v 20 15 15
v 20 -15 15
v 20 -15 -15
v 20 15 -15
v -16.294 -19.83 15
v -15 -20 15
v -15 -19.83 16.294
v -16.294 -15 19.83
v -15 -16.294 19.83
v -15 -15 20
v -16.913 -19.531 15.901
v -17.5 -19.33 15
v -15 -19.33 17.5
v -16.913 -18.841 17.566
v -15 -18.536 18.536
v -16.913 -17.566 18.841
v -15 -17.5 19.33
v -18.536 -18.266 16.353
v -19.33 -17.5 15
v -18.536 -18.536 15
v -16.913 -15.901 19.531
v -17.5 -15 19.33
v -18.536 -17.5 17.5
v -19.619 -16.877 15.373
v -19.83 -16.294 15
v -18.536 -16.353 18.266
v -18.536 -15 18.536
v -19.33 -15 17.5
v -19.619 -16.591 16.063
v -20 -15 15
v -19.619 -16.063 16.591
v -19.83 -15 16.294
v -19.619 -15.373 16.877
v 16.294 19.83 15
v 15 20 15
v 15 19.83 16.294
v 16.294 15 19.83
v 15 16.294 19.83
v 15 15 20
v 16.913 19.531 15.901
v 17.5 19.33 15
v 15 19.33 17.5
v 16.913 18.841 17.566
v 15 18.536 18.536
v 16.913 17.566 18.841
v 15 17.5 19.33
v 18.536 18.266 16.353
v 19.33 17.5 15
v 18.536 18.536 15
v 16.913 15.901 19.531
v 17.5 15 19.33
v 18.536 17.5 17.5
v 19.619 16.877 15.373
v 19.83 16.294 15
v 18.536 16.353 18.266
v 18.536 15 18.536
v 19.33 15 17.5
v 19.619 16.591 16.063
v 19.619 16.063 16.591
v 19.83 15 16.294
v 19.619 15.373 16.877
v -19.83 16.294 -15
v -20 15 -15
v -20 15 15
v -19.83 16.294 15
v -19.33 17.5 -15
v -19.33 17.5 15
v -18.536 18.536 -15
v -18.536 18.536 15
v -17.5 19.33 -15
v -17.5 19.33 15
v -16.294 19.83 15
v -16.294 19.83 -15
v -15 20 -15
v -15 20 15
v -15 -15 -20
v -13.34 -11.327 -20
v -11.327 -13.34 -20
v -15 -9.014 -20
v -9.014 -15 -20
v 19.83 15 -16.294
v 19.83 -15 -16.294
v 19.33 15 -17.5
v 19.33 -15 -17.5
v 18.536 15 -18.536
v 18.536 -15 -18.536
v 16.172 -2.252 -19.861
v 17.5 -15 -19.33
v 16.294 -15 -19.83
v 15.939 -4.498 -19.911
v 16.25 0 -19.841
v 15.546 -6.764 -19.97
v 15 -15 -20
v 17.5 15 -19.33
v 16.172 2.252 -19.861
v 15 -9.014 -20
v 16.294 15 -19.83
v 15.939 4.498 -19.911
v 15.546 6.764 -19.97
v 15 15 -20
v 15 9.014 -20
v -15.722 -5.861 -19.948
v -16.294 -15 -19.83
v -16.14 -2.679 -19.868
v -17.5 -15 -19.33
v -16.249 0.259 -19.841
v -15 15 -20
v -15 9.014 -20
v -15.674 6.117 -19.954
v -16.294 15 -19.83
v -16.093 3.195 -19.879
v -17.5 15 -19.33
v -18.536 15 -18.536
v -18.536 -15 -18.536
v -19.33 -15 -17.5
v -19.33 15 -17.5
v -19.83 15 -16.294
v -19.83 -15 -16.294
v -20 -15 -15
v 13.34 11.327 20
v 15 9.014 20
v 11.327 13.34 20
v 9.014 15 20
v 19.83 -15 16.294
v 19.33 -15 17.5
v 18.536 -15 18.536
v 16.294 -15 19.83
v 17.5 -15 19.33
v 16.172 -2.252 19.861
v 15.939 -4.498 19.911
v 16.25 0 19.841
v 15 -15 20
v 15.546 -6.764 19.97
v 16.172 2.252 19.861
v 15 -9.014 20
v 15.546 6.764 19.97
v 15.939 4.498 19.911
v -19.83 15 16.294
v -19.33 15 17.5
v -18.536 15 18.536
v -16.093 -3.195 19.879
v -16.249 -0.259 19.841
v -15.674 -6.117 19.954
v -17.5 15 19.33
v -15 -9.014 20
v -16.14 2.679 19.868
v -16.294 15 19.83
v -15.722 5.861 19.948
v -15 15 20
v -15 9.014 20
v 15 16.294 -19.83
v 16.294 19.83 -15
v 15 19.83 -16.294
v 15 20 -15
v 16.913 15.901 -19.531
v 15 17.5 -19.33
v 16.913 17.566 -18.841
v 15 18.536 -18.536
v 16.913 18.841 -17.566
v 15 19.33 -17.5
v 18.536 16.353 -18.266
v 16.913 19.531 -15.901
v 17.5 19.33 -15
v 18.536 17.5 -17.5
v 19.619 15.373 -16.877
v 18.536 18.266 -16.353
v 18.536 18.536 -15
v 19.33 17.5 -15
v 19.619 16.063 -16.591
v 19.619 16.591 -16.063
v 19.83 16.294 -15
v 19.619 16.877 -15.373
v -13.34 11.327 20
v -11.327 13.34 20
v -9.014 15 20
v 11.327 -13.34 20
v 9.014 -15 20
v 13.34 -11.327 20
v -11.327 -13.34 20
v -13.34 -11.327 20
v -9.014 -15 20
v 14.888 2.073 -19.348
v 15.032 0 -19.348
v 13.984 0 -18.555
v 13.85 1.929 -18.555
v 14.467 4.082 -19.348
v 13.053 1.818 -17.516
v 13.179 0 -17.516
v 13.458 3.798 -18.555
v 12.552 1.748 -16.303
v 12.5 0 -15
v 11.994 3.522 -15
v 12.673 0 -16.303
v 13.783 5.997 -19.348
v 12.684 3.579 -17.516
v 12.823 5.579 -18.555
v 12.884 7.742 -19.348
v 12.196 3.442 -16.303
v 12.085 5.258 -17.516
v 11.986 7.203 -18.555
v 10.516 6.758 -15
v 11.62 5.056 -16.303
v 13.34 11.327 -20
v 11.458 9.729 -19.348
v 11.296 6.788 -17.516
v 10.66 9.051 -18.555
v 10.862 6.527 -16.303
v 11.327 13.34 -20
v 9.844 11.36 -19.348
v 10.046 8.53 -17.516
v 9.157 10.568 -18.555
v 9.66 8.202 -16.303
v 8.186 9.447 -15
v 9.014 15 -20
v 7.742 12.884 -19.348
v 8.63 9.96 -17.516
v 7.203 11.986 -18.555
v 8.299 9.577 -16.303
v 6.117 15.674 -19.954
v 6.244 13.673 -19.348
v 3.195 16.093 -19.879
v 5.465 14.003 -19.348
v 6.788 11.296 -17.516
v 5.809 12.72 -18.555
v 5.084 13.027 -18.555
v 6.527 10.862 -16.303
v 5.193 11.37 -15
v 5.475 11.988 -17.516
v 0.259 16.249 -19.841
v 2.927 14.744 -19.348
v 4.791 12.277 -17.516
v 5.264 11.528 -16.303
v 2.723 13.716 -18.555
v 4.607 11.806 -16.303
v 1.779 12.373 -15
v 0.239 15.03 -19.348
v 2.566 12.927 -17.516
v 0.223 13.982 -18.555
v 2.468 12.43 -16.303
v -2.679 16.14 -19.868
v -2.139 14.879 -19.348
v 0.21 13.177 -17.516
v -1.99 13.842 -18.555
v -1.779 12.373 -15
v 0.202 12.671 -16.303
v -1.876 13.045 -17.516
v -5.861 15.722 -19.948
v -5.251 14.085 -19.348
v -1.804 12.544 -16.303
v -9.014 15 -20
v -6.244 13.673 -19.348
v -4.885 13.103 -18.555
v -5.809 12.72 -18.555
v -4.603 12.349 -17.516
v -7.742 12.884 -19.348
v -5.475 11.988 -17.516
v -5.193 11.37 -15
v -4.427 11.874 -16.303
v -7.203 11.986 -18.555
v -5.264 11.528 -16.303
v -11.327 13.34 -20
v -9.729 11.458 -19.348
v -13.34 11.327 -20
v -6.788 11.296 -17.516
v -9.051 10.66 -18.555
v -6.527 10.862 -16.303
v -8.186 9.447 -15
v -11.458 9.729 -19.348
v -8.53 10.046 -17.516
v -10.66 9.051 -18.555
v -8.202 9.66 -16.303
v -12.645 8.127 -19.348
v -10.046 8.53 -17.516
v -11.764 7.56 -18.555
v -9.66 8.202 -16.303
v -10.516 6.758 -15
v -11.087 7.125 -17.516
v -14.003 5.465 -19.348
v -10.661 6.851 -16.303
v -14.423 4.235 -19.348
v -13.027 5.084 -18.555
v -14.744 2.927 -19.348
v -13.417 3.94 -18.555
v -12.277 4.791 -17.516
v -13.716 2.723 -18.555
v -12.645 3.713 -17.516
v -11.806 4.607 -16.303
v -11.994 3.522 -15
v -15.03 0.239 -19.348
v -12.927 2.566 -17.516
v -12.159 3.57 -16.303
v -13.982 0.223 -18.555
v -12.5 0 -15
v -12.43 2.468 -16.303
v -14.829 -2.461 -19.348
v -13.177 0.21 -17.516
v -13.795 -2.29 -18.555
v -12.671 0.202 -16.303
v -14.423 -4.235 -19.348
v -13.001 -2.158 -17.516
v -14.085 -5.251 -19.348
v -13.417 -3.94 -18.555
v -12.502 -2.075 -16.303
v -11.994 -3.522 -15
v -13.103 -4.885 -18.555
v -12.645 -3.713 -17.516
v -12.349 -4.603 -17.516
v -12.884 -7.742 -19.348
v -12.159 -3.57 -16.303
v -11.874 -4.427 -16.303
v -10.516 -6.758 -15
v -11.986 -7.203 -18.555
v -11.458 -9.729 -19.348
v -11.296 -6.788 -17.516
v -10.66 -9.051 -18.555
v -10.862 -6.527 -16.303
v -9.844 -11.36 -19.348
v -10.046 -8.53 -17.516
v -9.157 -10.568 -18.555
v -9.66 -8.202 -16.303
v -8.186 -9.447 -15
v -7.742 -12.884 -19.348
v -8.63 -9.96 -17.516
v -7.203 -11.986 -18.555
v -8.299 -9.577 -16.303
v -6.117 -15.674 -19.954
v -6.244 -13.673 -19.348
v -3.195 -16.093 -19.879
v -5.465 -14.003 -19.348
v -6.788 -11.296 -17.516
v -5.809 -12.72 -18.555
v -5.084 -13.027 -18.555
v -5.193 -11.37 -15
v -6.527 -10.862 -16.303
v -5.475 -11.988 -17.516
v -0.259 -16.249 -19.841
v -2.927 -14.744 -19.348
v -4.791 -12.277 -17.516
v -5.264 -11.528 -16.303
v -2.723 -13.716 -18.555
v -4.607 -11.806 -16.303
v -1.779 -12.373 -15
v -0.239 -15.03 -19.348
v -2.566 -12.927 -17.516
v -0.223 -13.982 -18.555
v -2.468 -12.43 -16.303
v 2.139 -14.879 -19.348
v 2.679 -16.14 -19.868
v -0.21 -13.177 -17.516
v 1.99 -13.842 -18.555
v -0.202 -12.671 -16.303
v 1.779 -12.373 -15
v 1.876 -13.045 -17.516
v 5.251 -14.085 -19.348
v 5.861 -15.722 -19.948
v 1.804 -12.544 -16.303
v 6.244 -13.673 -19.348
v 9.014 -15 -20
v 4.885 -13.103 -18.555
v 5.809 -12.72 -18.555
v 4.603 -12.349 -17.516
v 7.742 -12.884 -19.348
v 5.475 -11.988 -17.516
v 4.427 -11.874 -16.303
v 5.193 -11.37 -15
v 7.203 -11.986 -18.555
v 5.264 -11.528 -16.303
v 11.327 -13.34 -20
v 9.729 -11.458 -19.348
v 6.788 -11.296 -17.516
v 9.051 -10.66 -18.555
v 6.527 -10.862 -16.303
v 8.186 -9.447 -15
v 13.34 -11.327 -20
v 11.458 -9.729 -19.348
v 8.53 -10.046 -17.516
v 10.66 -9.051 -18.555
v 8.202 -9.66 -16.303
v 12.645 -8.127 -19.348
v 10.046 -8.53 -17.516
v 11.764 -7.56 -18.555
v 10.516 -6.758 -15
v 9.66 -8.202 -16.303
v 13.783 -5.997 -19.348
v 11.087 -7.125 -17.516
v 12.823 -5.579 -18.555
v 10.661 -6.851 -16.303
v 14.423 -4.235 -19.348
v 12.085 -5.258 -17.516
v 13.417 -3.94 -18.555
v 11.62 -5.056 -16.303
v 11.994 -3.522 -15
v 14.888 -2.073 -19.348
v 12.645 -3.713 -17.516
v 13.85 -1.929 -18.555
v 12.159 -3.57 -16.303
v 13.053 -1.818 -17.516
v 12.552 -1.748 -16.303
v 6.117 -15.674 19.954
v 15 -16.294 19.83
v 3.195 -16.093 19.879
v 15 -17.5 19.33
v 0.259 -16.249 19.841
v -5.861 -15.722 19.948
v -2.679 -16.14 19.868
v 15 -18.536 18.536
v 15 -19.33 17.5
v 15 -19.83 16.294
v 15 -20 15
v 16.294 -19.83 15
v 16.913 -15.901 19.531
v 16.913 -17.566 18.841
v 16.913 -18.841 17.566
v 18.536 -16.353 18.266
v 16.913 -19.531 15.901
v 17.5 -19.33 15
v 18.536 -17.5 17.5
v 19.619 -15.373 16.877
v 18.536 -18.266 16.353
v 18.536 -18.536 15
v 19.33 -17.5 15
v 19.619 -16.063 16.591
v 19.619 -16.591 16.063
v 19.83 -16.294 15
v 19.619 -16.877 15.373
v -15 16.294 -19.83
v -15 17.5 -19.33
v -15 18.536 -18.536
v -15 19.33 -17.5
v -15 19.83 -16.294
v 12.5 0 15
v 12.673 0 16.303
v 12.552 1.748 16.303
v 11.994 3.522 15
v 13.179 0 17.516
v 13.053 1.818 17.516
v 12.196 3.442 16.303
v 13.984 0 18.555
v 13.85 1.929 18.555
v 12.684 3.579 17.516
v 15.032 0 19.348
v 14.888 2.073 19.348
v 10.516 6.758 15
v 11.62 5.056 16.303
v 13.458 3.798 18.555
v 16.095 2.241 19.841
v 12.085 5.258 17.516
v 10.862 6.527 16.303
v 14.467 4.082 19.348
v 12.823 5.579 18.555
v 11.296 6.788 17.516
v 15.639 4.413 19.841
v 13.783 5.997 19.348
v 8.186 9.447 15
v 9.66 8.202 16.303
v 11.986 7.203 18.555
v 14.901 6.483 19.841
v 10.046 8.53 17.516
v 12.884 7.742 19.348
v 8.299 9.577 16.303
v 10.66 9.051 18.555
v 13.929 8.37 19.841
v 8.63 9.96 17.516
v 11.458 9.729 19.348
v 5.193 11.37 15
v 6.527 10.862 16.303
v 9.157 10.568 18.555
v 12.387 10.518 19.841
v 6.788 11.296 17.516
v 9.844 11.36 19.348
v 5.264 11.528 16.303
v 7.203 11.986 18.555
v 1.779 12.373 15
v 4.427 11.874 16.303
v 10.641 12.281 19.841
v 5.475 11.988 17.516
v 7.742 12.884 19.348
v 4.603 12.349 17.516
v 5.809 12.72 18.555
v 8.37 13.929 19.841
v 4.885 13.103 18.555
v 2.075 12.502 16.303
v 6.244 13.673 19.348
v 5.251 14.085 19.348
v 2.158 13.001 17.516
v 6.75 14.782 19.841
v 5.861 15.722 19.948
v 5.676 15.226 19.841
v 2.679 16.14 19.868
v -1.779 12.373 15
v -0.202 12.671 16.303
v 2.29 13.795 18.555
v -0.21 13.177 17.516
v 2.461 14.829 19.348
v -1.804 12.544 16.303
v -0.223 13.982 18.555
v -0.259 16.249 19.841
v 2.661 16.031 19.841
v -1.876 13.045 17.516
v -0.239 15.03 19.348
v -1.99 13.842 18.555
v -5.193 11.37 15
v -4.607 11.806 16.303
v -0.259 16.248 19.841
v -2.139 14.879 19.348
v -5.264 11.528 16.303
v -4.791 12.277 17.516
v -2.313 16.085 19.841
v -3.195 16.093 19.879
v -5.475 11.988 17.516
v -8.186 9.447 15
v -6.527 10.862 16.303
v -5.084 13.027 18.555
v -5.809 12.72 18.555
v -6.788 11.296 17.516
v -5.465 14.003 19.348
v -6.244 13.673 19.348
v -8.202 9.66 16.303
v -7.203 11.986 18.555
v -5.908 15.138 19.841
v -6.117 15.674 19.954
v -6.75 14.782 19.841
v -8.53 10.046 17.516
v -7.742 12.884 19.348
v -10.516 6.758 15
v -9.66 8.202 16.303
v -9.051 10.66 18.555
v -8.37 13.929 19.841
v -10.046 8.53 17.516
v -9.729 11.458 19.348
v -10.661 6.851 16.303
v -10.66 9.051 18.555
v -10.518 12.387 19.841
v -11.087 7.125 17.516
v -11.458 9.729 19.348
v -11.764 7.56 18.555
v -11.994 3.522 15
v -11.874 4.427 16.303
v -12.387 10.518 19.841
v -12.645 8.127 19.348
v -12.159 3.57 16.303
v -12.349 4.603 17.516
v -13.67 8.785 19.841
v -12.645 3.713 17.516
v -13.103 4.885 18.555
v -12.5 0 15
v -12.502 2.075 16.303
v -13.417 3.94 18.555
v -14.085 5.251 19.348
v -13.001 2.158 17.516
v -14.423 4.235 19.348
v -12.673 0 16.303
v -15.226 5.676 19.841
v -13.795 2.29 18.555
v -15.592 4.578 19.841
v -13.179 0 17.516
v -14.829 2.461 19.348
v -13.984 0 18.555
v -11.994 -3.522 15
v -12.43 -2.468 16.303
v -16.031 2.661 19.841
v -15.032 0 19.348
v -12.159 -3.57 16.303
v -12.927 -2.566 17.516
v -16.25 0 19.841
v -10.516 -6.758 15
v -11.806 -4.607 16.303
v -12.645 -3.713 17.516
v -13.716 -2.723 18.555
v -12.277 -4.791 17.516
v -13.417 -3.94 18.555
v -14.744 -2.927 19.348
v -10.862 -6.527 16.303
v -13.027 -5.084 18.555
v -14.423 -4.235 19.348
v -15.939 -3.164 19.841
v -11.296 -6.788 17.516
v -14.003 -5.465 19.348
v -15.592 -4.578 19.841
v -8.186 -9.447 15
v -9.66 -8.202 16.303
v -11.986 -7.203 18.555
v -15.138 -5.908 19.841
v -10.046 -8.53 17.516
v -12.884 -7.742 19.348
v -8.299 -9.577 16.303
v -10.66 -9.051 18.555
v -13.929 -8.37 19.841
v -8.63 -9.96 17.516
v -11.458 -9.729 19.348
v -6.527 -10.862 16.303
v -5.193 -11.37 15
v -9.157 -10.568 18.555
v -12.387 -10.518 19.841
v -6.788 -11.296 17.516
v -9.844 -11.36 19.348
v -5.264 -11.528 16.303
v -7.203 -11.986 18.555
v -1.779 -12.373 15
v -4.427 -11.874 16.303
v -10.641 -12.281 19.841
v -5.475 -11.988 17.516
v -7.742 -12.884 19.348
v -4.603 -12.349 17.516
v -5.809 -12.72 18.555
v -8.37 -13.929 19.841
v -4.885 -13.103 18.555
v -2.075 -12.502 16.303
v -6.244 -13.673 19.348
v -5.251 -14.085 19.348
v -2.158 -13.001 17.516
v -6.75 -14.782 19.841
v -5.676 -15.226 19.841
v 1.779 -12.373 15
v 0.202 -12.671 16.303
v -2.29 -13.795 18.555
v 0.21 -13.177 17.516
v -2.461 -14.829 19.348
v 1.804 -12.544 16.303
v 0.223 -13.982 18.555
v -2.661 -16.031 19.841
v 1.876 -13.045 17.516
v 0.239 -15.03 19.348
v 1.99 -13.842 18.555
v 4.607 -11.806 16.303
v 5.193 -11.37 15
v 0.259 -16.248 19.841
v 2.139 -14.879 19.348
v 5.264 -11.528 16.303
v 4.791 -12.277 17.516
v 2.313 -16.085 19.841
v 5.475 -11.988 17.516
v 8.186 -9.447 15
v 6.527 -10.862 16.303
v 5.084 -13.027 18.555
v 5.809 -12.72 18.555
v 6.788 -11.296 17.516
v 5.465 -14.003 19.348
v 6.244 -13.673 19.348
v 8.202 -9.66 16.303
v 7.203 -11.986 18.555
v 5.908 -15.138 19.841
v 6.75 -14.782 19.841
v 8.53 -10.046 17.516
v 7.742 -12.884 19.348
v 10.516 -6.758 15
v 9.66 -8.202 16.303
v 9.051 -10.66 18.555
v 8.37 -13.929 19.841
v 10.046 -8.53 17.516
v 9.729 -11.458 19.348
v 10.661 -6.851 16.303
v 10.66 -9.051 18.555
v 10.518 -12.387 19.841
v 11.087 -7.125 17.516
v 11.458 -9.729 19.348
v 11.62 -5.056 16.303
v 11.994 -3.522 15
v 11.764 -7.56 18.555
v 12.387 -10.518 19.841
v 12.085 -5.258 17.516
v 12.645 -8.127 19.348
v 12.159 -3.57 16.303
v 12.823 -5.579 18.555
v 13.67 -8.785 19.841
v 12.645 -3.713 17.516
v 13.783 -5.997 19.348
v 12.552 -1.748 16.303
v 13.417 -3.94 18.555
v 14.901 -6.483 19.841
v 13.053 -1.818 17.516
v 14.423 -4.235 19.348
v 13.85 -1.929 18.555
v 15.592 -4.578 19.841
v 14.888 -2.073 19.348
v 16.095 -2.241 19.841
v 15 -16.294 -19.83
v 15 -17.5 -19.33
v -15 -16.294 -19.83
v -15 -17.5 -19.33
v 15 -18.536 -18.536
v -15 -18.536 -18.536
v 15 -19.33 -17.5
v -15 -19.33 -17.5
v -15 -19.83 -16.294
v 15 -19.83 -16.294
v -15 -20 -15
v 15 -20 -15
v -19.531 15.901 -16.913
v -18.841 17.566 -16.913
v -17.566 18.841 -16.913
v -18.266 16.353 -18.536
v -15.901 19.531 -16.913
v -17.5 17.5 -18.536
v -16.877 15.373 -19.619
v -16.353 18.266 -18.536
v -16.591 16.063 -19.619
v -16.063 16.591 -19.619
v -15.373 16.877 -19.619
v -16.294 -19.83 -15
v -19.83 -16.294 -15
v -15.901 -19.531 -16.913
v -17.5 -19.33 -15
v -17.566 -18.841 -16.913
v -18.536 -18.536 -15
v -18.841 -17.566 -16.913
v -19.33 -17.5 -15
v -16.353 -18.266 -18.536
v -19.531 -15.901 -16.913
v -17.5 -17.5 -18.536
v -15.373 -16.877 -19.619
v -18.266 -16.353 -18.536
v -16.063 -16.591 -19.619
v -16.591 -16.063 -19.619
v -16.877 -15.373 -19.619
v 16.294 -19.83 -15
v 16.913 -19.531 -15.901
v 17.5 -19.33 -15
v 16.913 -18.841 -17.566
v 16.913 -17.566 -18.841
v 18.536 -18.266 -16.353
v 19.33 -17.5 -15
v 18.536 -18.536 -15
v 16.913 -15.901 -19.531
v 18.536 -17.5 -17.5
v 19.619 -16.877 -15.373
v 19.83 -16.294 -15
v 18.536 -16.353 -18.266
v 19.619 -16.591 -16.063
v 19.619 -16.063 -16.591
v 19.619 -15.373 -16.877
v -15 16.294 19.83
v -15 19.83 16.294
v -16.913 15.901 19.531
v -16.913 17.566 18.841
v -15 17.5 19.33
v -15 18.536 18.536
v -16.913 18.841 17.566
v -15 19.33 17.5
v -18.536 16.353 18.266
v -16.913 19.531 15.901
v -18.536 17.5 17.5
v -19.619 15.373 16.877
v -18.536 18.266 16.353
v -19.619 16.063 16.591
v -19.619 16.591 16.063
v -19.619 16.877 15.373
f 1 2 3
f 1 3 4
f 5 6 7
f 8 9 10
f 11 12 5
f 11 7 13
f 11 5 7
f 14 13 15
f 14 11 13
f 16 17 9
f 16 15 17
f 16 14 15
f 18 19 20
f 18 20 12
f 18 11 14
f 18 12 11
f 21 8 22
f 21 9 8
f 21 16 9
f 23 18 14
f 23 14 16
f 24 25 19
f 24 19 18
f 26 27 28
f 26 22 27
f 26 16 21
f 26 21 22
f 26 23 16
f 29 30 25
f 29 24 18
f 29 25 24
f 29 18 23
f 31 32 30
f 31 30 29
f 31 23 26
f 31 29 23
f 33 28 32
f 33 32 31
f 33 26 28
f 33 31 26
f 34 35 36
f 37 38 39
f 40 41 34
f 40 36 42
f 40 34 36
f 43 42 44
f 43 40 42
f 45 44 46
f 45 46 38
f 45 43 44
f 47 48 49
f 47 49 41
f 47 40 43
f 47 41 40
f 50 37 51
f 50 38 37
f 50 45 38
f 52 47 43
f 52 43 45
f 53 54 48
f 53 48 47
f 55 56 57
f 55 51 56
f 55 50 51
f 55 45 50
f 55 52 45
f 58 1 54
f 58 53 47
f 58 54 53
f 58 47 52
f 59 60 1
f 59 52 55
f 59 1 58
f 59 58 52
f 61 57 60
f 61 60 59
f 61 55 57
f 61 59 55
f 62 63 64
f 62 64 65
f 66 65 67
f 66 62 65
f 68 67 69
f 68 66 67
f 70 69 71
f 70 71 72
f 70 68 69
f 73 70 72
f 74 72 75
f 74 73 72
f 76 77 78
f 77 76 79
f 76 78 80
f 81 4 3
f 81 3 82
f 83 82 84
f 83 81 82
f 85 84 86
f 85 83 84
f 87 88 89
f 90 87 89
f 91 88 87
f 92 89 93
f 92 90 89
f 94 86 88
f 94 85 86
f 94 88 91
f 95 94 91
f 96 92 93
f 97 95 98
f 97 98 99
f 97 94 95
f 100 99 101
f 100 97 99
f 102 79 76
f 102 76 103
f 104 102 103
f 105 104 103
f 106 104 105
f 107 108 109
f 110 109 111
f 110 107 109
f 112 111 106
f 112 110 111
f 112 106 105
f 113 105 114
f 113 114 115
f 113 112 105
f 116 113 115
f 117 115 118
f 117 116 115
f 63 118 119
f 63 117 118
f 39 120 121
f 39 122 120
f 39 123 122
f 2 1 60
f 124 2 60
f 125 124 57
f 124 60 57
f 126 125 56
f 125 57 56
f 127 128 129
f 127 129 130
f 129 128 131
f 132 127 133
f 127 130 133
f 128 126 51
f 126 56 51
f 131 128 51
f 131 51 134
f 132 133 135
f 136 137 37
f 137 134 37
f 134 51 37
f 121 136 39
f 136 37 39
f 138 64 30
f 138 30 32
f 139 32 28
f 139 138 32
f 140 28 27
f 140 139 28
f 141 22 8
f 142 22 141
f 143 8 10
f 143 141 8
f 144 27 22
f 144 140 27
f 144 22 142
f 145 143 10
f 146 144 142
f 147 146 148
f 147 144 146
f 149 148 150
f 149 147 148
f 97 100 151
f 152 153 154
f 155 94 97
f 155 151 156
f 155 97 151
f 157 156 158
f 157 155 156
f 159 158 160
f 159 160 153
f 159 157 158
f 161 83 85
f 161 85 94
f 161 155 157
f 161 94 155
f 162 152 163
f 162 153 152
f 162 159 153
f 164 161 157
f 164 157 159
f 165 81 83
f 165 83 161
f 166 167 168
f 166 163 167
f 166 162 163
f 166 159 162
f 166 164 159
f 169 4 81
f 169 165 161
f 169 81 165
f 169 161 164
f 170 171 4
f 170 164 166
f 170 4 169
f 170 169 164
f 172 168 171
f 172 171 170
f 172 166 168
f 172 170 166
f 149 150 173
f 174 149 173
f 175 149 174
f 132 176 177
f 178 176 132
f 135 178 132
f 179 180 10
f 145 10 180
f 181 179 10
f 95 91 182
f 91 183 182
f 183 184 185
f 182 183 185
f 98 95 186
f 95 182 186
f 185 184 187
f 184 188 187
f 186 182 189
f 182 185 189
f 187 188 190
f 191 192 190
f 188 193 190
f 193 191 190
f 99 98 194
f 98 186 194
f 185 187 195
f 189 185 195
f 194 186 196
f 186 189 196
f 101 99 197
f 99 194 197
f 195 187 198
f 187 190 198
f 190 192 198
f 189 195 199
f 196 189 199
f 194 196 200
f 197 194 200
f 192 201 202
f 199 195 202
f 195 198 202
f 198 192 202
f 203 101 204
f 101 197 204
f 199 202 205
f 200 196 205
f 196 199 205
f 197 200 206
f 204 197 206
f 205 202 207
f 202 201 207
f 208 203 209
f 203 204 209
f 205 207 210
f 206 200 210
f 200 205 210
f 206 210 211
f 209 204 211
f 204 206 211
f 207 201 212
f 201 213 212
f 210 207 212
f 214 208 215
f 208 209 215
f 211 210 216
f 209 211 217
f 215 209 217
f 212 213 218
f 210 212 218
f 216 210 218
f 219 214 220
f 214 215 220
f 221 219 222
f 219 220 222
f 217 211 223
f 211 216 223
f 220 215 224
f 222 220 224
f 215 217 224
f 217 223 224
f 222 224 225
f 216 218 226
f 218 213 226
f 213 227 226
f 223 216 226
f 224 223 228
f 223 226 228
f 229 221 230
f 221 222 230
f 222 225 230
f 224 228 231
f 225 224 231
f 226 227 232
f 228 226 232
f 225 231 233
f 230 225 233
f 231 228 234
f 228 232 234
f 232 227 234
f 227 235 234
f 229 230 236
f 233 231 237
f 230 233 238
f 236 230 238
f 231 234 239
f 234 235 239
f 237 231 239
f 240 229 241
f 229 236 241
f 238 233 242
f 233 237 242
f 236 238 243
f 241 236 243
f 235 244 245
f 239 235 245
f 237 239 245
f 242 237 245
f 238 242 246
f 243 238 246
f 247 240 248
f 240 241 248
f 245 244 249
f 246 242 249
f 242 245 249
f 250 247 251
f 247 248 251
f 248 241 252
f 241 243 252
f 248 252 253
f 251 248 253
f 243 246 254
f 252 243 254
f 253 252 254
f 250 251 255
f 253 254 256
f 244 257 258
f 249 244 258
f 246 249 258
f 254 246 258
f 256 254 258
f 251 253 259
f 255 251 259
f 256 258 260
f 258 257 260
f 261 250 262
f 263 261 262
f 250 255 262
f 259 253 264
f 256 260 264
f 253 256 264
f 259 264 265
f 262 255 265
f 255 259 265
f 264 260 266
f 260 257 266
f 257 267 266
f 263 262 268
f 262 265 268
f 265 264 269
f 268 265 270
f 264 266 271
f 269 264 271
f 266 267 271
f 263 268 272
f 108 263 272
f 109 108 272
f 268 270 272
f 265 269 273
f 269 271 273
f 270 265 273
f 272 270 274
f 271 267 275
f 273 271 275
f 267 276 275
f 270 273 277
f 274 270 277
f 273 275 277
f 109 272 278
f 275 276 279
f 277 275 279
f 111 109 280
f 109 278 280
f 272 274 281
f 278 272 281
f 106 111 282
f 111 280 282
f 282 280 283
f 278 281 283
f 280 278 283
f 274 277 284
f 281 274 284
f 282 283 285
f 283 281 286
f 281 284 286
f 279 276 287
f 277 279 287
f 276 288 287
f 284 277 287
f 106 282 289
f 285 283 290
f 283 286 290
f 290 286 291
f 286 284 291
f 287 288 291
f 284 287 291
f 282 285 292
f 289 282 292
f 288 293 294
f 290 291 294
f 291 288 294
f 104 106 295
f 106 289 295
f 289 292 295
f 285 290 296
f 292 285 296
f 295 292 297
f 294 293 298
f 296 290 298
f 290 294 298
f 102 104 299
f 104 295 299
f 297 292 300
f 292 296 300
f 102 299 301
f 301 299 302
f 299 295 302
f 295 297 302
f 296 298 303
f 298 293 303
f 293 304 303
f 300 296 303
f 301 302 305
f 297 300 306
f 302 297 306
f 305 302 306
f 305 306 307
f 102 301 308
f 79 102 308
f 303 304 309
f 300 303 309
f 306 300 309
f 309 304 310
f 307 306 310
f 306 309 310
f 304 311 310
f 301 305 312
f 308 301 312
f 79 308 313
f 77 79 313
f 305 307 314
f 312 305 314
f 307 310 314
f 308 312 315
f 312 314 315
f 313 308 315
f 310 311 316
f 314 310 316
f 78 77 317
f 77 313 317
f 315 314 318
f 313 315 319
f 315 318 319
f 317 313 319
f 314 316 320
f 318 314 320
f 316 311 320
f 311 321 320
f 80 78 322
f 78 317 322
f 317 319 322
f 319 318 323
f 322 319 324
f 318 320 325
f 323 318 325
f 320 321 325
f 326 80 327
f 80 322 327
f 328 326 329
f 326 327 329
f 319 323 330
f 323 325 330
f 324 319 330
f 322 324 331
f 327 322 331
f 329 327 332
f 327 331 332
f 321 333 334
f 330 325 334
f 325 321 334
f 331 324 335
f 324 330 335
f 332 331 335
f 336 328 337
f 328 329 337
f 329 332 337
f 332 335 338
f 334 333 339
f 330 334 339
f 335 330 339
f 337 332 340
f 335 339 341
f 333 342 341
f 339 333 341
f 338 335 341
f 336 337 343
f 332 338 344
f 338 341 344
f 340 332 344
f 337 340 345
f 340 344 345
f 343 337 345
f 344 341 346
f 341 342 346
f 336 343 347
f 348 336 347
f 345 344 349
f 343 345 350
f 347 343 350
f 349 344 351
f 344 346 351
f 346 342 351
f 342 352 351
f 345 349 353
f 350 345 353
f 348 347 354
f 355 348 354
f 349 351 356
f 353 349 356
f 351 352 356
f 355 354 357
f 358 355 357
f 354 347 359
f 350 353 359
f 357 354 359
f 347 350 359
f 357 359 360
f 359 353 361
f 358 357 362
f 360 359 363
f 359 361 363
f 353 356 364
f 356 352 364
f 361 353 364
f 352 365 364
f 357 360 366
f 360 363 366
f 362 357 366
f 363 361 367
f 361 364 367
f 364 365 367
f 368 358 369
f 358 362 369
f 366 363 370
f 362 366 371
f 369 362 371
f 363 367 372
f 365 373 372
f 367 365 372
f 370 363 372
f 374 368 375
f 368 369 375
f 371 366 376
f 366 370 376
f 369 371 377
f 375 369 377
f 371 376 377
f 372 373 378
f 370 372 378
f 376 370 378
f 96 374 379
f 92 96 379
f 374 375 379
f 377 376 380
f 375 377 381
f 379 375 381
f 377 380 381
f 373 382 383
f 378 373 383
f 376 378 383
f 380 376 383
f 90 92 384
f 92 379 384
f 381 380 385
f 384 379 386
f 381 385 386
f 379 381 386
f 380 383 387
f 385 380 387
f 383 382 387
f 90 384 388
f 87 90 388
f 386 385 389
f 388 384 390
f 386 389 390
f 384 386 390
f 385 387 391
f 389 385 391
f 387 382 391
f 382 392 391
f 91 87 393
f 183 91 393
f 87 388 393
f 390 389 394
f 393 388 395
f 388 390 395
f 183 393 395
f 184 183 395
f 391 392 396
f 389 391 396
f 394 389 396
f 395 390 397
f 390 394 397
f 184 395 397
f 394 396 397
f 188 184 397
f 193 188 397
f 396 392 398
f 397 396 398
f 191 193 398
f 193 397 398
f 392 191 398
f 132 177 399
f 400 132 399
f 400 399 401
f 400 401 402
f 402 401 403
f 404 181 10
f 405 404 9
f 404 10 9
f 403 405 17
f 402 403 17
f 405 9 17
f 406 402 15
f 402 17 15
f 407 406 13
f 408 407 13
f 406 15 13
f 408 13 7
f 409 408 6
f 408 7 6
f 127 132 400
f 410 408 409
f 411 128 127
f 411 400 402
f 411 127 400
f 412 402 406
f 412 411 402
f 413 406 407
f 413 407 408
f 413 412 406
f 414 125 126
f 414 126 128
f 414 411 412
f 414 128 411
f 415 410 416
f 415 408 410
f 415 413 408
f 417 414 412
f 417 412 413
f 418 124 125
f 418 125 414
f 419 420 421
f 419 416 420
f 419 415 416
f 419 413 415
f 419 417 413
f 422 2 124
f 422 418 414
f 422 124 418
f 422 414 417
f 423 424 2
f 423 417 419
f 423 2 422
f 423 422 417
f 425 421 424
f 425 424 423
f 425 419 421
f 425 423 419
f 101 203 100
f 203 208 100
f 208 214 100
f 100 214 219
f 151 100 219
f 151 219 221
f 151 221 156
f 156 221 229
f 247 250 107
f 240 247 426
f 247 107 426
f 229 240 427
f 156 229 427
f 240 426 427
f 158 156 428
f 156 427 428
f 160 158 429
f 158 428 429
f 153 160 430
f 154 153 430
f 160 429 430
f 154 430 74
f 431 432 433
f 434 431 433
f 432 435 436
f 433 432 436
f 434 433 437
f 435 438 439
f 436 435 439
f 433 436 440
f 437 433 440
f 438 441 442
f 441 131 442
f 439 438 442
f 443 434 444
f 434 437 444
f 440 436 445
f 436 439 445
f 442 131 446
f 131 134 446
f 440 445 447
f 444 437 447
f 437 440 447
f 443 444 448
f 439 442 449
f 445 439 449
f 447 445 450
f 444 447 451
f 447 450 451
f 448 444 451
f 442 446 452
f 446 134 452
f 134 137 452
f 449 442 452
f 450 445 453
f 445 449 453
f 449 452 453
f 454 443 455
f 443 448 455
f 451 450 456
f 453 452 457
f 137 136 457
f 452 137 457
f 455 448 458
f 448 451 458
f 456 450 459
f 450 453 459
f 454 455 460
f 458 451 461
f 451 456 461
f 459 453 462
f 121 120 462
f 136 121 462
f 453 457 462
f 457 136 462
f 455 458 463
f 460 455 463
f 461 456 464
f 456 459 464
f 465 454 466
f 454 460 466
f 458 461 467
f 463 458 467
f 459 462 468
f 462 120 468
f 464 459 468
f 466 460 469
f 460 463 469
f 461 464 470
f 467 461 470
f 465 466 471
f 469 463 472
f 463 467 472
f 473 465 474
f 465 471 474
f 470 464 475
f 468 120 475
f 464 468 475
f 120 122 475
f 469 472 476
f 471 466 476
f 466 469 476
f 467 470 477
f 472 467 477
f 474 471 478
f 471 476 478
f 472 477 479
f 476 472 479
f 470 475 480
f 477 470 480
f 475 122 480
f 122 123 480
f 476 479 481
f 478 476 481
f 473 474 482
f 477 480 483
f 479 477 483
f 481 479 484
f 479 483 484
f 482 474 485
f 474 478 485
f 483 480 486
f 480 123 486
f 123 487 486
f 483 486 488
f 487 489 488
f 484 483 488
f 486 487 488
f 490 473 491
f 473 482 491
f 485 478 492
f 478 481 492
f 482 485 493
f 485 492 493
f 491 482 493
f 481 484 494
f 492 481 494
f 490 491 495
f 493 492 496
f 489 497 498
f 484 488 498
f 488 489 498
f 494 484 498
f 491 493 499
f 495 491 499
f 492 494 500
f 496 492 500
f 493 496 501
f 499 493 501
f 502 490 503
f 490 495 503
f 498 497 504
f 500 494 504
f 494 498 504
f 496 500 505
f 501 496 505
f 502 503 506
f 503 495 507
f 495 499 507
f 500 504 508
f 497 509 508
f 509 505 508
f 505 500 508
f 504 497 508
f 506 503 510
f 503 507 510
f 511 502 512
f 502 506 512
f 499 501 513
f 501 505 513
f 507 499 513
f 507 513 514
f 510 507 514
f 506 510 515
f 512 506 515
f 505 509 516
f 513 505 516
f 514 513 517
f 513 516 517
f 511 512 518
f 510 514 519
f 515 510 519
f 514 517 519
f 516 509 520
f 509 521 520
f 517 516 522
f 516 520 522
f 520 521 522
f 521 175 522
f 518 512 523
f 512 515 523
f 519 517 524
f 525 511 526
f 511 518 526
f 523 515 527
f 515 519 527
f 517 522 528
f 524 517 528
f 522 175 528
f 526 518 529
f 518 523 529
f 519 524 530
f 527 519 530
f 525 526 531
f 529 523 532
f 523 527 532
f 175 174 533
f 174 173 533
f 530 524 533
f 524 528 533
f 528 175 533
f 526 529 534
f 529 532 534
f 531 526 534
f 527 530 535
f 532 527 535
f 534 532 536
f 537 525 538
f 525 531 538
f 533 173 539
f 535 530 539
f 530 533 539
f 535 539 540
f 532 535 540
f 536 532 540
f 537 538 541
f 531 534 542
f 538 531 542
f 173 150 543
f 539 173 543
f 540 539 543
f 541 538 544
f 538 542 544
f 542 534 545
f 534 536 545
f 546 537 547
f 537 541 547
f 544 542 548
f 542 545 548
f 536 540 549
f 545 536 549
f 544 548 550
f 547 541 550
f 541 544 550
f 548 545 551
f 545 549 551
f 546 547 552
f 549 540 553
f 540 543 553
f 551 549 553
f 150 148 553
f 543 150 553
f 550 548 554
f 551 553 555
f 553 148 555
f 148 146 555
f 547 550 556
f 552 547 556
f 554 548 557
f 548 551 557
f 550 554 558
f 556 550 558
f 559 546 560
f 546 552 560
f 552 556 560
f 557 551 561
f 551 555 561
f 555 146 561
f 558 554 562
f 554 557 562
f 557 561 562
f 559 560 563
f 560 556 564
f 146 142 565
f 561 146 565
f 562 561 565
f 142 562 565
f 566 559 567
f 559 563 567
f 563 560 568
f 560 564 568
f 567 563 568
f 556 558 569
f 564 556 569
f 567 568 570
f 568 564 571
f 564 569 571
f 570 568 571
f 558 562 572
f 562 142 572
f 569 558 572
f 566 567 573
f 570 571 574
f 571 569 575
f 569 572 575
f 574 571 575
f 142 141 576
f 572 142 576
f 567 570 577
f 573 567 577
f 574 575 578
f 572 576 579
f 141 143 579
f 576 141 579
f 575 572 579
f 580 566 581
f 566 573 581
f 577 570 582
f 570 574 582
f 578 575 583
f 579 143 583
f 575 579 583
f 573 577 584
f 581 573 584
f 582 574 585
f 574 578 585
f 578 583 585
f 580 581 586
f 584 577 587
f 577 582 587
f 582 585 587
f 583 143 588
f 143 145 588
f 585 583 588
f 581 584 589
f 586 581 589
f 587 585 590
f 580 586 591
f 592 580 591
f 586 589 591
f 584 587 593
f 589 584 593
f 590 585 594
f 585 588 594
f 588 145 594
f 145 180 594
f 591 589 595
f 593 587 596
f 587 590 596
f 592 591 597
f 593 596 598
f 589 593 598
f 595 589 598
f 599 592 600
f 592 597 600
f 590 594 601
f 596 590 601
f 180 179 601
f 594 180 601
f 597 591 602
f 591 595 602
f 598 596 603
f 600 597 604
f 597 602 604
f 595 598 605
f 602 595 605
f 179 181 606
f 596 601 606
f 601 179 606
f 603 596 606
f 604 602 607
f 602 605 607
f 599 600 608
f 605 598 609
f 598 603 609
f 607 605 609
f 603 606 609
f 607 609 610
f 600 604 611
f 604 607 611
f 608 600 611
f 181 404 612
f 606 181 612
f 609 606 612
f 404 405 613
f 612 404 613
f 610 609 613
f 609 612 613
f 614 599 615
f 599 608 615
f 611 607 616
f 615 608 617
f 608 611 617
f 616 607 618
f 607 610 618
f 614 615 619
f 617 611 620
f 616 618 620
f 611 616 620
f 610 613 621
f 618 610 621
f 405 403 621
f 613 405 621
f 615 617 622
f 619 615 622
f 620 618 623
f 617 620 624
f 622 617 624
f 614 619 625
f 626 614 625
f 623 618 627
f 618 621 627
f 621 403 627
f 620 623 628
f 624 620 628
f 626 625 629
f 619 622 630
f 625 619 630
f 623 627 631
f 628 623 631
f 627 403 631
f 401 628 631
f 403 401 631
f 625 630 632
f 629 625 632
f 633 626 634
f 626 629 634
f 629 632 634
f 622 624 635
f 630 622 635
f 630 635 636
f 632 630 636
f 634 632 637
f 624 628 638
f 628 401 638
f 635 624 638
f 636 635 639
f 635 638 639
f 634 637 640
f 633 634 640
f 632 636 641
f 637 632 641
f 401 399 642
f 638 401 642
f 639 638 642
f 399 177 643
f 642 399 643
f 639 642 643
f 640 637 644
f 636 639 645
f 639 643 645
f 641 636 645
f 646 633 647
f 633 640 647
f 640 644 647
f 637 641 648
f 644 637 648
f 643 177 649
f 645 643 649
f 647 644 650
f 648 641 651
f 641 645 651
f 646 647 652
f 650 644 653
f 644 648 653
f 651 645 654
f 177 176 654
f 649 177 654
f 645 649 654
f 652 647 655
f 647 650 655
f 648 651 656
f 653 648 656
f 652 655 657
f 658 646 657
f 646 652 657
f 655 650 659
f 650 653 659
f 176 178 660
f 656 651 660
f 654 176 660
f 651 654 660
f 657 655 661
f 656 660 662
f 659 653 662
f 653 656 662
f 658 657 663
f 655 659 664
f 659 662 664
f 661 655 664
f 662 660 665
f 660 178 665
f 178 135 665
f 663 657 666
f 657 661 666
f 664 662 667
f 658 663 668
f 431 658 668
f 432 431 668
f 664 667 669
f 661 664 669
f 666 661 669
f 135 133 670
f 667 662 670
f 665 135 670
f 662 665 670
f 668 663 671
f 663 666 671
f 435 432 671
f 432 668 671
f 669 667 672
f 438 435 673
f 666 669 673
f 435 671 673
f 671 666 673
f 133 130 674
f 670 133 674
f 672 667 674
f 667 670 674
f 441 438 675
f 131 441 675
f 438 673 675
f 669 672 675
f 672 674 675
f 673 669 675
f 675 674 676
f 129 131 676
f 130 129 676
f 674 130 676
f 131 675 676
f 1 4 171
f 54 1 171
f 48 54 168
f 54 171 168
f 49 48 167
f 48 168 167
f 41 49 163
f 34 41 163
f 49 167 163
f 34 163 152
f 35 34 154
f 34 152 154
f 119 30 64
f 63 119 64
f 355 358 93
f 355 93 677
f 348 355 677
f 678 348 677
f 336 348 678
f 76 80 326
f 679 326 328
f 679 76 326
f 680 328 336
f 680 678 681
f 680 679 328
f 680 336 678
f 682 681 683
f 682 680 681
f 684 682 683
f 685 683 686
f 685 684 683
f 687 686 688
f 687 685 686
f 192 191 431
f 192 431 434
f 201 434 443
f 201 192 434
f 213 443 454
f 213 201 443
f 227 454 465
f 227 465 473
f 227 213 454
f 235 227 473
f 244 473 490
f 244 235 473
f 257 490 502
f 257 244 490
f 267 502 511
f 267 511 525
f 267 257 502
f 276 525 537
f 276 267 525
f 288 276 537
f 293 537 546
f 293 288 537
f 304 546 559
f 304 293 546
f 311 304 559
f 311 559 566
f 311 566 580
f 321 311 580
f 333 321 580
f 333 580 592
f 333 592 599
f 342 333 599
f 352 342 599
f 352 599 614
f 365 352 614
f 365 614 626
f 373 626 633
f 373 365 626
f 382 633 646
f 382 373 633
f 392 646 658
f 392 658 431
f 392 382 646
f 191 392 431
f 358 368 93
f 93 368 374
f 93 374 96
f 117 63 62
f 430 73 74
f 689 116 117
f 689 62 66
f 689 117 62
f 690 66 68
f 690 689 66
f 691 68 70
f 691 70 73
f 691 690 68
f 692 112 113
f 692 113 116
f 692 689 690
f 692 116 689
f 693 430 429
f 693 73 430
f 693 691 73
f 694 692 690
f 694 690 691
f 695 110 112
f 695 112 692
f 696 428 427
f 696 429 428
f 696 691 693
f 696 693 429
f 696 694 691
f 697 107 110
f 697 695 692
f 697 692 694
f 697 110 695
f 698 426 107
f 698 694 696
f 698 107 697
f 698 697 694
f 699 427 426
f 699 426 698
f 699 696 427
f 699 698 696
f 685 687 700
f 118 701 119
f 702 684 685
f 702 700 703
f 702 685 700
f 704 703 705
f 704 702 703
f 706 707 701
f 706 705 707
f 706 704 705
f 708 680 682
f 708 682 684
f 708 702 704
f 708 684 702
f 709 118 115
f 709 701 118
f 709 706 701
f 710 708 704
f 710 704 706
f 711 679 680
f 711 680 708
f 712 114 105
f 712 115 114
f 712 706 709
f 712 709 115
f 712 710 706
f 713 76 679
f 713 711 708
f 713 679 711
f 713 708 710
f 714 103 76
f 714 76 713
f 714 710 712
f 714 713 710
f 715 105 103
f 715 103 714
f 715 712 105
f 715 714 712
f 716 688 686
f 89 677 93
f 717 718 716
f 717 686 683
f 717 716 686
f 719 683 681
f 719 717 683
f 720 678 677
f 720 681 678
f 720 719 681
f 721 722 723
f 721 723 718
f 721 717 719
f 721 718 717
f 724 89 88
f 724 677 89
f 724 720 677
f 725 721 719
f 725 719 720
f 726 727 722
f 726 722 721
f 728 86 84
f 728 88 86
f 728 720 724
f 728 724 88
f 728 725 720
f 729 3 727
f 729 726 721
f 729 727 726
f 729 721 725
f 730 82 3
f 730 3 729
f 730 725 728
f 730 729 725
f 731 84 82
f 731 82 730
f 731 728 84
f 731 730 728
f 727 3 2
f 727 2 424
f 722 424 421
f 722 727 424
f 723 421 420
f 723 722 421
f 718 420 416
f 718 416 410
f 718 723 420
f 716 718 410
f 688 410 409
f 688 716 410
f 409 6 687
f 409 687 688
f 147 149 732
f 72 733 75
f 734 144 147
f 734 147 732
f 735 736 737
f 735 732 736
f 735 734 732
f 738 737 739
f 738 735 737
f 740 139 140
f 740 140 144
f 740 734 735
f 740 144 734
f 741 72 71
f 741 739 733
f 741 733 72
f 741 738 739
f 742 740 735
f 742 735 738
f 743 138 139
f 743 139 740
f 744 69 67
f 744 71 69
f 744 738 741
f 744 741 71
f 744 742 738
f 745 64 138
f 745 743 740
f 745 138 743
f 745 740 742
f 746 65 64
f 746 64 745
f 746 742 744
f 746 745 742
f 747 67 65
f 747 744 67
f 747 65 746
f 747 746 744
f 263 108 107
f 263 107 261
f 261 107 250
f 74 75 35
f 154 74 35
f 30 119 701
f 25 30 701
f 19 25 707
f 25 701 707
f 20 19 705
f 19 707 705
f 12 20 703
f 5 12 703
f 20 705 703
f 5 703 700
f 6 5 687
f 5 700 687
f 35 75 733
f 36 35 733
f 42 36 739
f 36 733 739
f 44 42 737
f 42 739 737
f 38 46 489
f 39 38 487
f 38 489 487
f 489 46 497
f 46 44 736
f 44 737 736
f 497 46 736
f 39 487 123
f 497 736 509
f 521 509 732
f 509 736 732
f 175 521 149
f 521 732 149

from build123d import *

# Parameters (mm, degrees)
F0_W          = 40
F0_H          = 40
F0_R          = 12.5
F1_DEPTH      = 20
F1_DEPTH_BACK = 20
F2_T1_DEPTH   = 30
F2_T3_DEPTH   = 30
F2_T5_DEPTH   = 30
F2_S9_W       = 5
F2_S9_H       = 5
F2_T10_DEPTH  = 5
F2_S15_W      = 5
F2_S15_H      = 5
F2_T16_DEPTH  = 5
F2_S21_W      = 5
F2_S21_H      = 5
F2_T22_DEPTH  = 5
F2_S27_W      = 5
F2_S27_H      = 5
F2_T28_DEPTH  = 5
F2_S33_W      = 5
F2_S33_H      = 5
F2_T34_DEPTH  = 5
F2_S39_W      = 5
F2_S39_H      = 5
F2_T40_DEPTH  = 5
F2_S45_W      = 5
F2_S45_H      = 5
F2_T46_DEPTH  = 5
F2_S51_W      = 5
F2_S51_H      = 5
F2_T52_DEPTH  = 5


# Not quite as in the source:
# - a fillet or chamfer that OpenCascade refuses, or shapes differently, is made with other operations: its cross-section is extruded or revolved along the edge and cut away or added


with BuildPart() as f1:
    # F0 (on Top) → F1 (new body, two sides)
    with BuildSketch(Plane.XY) as f1_sk:
        Rectangle(F0_W, F0_H)
        Circle(F0_R, mode=Mode.SUBTRACT)
    extrude(amount=F1_DEPTH)
    extrude(f1_sk.sketch, amount=-F1_DEPTH_BACK)

    # F2: fillet of radius 5 on 14 edges, made by hand

    # F2_s2 → F2_t1 (cut)
    with BuildSketch(Plane.XZ.offset(-15)):
        with BuildLine():
            ThreePointArc((20, 15), (18.5355339059, 18.5355339059), (15, 20))
            Line((15, 20), (20, 20))
            Line((20, 20), (20, 15))
        make_face()
        with BuildLine():
            ThreePointArc((-20, 15), (-18.5355339059, 18.5355339059), (-15, 20))
            Line((-15, 20), (-20, 20))
            Line((-20, 20), (-20, 15))
        make_face()
        with BuildLine():
            ThreePointArc((20, -15), (18.5355339059, -18.5355339059), (15, -20))
            Line((15, -20), (20, -20))
            Line((20, -20), (20, -15))
        make_face()
        with BuildLine():
            ThreePointArc((-15, -20), (-18.5355339059, -18.5355339059), (-20, -15))
            Line((-20, -15), (-20, -20))
            Line((-20, -20), (-15, -20))
        make_face()
    extrude(amount=F2_T1_DEPTH, mode=Mode.SUBTRACT)

    # F2_s4 → F2_t3 (cut)
    with BuildSketch(Plane.YZ.offset(-15)):
        with BuildLine():
            ThreePointArc((20, 15), (18.5355339059, 18.5355339059), (15, 20))
            Line((15, 20), (20, 20))
            Line((20, 20), (20, 15))
        make_face()
        with BuildLine():
            ThreePointArc((-15, 20), (-18.5355339059, 18.5355339059), (-20, 15))
            Line((-20, 15), (-20, 20))
            Line((-20, 20), (-15, 20))
        make_face()
        with BuildLine():
            ThreePointArc((15, -20), (18.5355339059, -18.5355339059), (20, -15))
            Line((20, -15), (20, -20))
            Line((20, -20), (15, -20))
        make_face()
        with BuildLine():
            ThreePointArc((-15, -20), (-18.5355339059, -18.5355339059), (-20, -15))
            Line((-20, -15), (-20, -20))
            Line((-20, -20), (-15, -20))
        make_face()
    extrude(amount=F2_T3_DEPTH, mode=Mode.SUBTRACT)

    # F2_s6 → F2_t5 (cut)
    with BuildSketch(Plane.XY.offset(-15)):
        with BuildLine():
            ThreePointArc((-20, 15), (-18.5355339059, 18.5355339059), (-15, 20))
            Line((-15, 20), (-20, 20))
            Line((-20, 20), (-20, 15))
        make_face()
        with BuildLine():
            ThreePointArc((20, 15), (18.5355339059, 18.5355339059), (15, 20))
            Line((15, 20), (20, 20))
            Line((20, 20), (20, 15))
        make_face()
        with BuildLine():
            ThreePointArc((-20, -15), (-18.5355339059, -18.5355339059), (-15, -20))
            Line((-15, -20), (-20, -20))
            Line((-20, -20), (-20, -15))
        make_face()
        with BuildLine():
            ThreePointArc((20, -15), (18.5355339059, -18.5355339059), (15, -20))
            Line((15, -20), (20, -20))
            Line((20, -20), (20, -15))
        make_face()
    extrude(amount=F2_T5_DEPTH, mode=Mode.SUBTRACT)


with BuildPart() as f2_tool8:
    # F2_s9 → F2_t10 (new body)
    with BuildSketch(Plane.YZ.offset(15)):
        with Locations((-17.5, 17.5)):
            Rectangle(F2_S9_W, F2_S9_H)
    extrude(amount=F2_T10_DEPTH)

    # F2_s11 → F2_t12 (revolve, cut)
    with BuildSketch(Plane(origin=(15, -15, 15), x_dir=(0, 0.7071067812, -0.7071067812), z_dir=(0, -0.7071067812, -0.7071067812))):
        with BuildLine():
            ThreePointArc((0, -5), (5, 0), (0, 5))
            Line((0, 5), (0, -5))
        make_face()
    revolve(axis=Axis((15, -15, 15), (1, 0, 0)), mode=Mode.SUBTRACT)


with BuildPart() as f1_1:
    add(f1.part)

    # F2_t7: cut F2_tool8
    add(f2_tool8.part, mode=Mode.SUBTRACT)


with BuildPart() as f2_tool14:
    # F2_s15 → F2_t16 (new body)
    with BuildSketch(Plane.YZ.offset(15)):
        with Locations((17.5, 17.5)):
            Rectangle(F2_S15_W, F2_S15_H)
    extrude(amount=F2_T16_DEPTH)

    # F2_s17 → F2_t18 (revolve, cut)
    with BuildSketch(Plane(origin=(15, 15, 15), x_dir=(0, -0.7071067812, -0.7071067812), z_dir=(0, -0.7071067812, 0.7071067812))):
        with BuildLine():
            ThreePointArc((0, -5), (5, 0), (0, 5))
            Line((0, 5), (0, -5))
        make_face()
    revolve(axis=Axis((15, 15, 15), (1, 0, 0)), mode=Mode.SUBTRACT)


with BuildPart() as f1_2:
    add(f1_1.part)

    # F2_t13: cut F2_tool14
    add(f2_tool14.part, mode=Mode.SUBTRACT)


with BuildPart() as f2_tool20:
    # F2_s21 → F2_t22 (new body)
    with BuildSketch(Plane.YZ.offset(-15)):
        with Locations((17.5, 17.5)):
            Rectangle(F2_S21_W, F2_S21_H)
    extrude(amount=-F2_T22_DEPTH)

    # F2_s23 → F2_t24 (revolve, cut)
    with BuildSketch(Plane(origin=(-15, 15, 15), x_dir=(0, -0.7071067812, -0.7071067812), z_dir=(0, 0.7071067812, -0.7071067812))):
        with BuildLine():
            ThreePointArc((0, -5), (5, 0), (0, 5))
            Line((0, 5), (0, -5))
        make_face()
    revolve(axis=Axis((-15, 15, 15), (-1, 0, 0)), mode=Mode.SUBTRACT)


with BuildPart() as f1_3:
    add(f1_2.part)

    # F2_t19: cut F2_tool20
    add(f2_tool20.part, mode=Mode.SUBTRACT)


with BuildPart() as f2_tool26:
    # F2_s27 → F2_t28 (new body)
    with BuildSketch(Plane.YZ.offset(-15)):
        with Locations((-17.5, 17.5)):
            Rectangle(F2_S27_W, F2_S27_H)
    extrude(amount=-F2_T28_DEPTH)

    # F2_s29 → F2_t30 (revolve, cut)
    with BuildSketch(Plane(origin=(-15, -15, 15), x_dir=(0, 0.7071067812, -0.7071067812), z_dir=(0, 0.7071067812, 0.7071067812))):
        with BuildLine():
            ThreePointArc((0, -5), (5, 0), (0, 5))
            Line((0, 5), (0, -5))
        make_face()
    revolve(axis=Axis((-15, -15, 15), (-1, 0, 0)), mode=Mode.SUBTRACT)


with BuildPart() as f1_4:
    add(f1_3.part)

    # F2_t25: cut F2_tool26
    add(f2_tool26.part, mode=Mode.SUBTRACT)


with BuildPart() as f2_tool32:
    # F2_s33 → F2_t34 (new body)
    with BuildSketch(Plane.XY.offset(-15)):
        with Locations((-17.5, 17.5)):
            Rectangle(F2_S33_W, F2_S33_H)
    extrude(amount=-F2_T34_DEPTH)

    # F2_s35 → F2_t36 (revolve, cut)
    with BuildSketch(Plane(origin=(-15, 15, -15), x_dir=(0.7071067812, -0.7071067812, 0), z_dir=(0.7071067812, 0.7071067812, 0))):
        with BuildLine():
            ThreePointArc((0, -5), (5, 0), (0, 5))
            Line((0, 5), (0, -5))
        make_face()
    revolve(axis=Axis((-15, 15, -15), (0, 0, -1)), mode=Mode.SUBTRACT)


with BuildPart() as f1_5:
    add(f1_4.part)

    # F2_t31: cut F2_tool32
    add(f2_tool32.part, mode=Mode.SUBTRACT)


with BuildPart() as f2_tool38:
    # F2_s39 → F2_t40 (new body)
    with BuildSketch(Plane.YZ.offset(15)):
        with Locations((17.5, -17.5)):
            Rectangle(F2_S39_W, F2_S39_H)
    extrude(amount=F2_T40_DEPTH)

    # F2_s41 → F2_t42 (revolve, cut)
    with BuildSketch(Plane(origin=(15, 15, -15), x_dir=(0, -0.7071067812, 0.7071067812), z_dir=(0, 0.7071067812, 0.7071067812))):
        with BuildLine():
            ThreePointArc((0, -5), (5, 0), (0, 5))
            Line((0, 5), (0, -5))
        make_face()
    revolve(axis=Axis((15, 15, -15), (1, 0, 0)), mode=Mode.SUBTRACT)


with BuildPart() as f1_6:
    add(f1_5.part)

    # F2_t37: cut F2_tool38
    add(f2_tool38.part, mode=Mode.SUBTRACT)


with BuildPart() as f2_tool44:
    # F2_s45 → F2_t46 (new body)
    with BuildSketch(Plane.YZ.offset(15)):
        with Locations((-17.5, -17.5)):
            Rectangle(F2_S45_W, F2_S45_H)
    extrude(amount=F2_T46_DEPTH)

    # F2_s47 → F2_t48 (revolve, cut)
    with BuildSketch(Plane(origin=(15, -15, -15), x_dir=(0, 0.7071067812, 0.7071067812), z_dir=(0, 0.7071067812, -0.7071067812))):
        with BuildLine():
            ThreePointArc((0, -5), (5, 0), (0, 5))
            Line((0, 5), (0, -5))
        make_face()
    revolve(axis=Axis((15, -15, -15), (1, 0, 0)), mode=Mode.SUBTRACT)


with BuildPart() as f1_7:
    add(f1_6.part)

    # F2_t43: cut F2_tool44
    add(f2_tool44.part, mode=Mode.SUBTRACT)


with BuildPart() as f2_tool50:
    # F2_s51 → F2_t52 (new body)
    with BuildSketch(Plane.XY.offset(-15)):
        with Locations((-17.5, -17.5)):
            Rectangle(F2_S51_W, F2_S51_H)
    extrude(amount=-F2_T52_DEPTH)

    # F2_s53 → F2_t54 (revolve, cut)
    with BuildSketch(Plane(origin=(-15, -15, -15), x_dir=(0.7071067812, 0.7071067812, 0), z_dir=(-0.7071067812, 0.7071067812, 0))):
        with BuildLine():
            ThreePointArc((0, -5), (5, 0), (0, 5))
            Line((0, 5), (0, -5))
        make_face()
    revolve(axis=Axis((-15, -15, -15), (0, 0, -1)), mode=Mode.SUBTRACT)


with BuildPart() as f1_8:
    add(f1_7.part)

    # F2_t49: cut F2_tool50
    add(f2_tool50.part, mode=Mode.SUBTRACT)

    # F2_s55 → F2_t56 (revolve, cut)
    with BuildSketch(Plane.XZ):
        with BuildLine():
            ThreePointArc((12.5, 15), (13.9644660941, 18.5355339059), (17.5, 20))
            Line((17.5, 20), (12.5, 20))
            Line((12.5, 20), (12.5, 15))
        make_face()
    revolve(axis=Axis((0, 0, 20), (0, 0, 1)), mode=Mode.SUBTRACT)

    # F2_s57 → F2_t58 (revolve, cut)
    with BuildSketch(Plane.XZ):
        with BuildLine():
            ThreePointArc((17.5, -20), (13.9644660941, -18.5355339059), (12.5, -15))
            Line((12.5, -15), (12.5, -20))
            Line((12.5, -20), (17.5, -20))
        make_face()
    revolve(axis=Axis((0, 0, -20), (0, 0, 1)), mode=Mode.SUBTRACT)


solid = f1_8.part
